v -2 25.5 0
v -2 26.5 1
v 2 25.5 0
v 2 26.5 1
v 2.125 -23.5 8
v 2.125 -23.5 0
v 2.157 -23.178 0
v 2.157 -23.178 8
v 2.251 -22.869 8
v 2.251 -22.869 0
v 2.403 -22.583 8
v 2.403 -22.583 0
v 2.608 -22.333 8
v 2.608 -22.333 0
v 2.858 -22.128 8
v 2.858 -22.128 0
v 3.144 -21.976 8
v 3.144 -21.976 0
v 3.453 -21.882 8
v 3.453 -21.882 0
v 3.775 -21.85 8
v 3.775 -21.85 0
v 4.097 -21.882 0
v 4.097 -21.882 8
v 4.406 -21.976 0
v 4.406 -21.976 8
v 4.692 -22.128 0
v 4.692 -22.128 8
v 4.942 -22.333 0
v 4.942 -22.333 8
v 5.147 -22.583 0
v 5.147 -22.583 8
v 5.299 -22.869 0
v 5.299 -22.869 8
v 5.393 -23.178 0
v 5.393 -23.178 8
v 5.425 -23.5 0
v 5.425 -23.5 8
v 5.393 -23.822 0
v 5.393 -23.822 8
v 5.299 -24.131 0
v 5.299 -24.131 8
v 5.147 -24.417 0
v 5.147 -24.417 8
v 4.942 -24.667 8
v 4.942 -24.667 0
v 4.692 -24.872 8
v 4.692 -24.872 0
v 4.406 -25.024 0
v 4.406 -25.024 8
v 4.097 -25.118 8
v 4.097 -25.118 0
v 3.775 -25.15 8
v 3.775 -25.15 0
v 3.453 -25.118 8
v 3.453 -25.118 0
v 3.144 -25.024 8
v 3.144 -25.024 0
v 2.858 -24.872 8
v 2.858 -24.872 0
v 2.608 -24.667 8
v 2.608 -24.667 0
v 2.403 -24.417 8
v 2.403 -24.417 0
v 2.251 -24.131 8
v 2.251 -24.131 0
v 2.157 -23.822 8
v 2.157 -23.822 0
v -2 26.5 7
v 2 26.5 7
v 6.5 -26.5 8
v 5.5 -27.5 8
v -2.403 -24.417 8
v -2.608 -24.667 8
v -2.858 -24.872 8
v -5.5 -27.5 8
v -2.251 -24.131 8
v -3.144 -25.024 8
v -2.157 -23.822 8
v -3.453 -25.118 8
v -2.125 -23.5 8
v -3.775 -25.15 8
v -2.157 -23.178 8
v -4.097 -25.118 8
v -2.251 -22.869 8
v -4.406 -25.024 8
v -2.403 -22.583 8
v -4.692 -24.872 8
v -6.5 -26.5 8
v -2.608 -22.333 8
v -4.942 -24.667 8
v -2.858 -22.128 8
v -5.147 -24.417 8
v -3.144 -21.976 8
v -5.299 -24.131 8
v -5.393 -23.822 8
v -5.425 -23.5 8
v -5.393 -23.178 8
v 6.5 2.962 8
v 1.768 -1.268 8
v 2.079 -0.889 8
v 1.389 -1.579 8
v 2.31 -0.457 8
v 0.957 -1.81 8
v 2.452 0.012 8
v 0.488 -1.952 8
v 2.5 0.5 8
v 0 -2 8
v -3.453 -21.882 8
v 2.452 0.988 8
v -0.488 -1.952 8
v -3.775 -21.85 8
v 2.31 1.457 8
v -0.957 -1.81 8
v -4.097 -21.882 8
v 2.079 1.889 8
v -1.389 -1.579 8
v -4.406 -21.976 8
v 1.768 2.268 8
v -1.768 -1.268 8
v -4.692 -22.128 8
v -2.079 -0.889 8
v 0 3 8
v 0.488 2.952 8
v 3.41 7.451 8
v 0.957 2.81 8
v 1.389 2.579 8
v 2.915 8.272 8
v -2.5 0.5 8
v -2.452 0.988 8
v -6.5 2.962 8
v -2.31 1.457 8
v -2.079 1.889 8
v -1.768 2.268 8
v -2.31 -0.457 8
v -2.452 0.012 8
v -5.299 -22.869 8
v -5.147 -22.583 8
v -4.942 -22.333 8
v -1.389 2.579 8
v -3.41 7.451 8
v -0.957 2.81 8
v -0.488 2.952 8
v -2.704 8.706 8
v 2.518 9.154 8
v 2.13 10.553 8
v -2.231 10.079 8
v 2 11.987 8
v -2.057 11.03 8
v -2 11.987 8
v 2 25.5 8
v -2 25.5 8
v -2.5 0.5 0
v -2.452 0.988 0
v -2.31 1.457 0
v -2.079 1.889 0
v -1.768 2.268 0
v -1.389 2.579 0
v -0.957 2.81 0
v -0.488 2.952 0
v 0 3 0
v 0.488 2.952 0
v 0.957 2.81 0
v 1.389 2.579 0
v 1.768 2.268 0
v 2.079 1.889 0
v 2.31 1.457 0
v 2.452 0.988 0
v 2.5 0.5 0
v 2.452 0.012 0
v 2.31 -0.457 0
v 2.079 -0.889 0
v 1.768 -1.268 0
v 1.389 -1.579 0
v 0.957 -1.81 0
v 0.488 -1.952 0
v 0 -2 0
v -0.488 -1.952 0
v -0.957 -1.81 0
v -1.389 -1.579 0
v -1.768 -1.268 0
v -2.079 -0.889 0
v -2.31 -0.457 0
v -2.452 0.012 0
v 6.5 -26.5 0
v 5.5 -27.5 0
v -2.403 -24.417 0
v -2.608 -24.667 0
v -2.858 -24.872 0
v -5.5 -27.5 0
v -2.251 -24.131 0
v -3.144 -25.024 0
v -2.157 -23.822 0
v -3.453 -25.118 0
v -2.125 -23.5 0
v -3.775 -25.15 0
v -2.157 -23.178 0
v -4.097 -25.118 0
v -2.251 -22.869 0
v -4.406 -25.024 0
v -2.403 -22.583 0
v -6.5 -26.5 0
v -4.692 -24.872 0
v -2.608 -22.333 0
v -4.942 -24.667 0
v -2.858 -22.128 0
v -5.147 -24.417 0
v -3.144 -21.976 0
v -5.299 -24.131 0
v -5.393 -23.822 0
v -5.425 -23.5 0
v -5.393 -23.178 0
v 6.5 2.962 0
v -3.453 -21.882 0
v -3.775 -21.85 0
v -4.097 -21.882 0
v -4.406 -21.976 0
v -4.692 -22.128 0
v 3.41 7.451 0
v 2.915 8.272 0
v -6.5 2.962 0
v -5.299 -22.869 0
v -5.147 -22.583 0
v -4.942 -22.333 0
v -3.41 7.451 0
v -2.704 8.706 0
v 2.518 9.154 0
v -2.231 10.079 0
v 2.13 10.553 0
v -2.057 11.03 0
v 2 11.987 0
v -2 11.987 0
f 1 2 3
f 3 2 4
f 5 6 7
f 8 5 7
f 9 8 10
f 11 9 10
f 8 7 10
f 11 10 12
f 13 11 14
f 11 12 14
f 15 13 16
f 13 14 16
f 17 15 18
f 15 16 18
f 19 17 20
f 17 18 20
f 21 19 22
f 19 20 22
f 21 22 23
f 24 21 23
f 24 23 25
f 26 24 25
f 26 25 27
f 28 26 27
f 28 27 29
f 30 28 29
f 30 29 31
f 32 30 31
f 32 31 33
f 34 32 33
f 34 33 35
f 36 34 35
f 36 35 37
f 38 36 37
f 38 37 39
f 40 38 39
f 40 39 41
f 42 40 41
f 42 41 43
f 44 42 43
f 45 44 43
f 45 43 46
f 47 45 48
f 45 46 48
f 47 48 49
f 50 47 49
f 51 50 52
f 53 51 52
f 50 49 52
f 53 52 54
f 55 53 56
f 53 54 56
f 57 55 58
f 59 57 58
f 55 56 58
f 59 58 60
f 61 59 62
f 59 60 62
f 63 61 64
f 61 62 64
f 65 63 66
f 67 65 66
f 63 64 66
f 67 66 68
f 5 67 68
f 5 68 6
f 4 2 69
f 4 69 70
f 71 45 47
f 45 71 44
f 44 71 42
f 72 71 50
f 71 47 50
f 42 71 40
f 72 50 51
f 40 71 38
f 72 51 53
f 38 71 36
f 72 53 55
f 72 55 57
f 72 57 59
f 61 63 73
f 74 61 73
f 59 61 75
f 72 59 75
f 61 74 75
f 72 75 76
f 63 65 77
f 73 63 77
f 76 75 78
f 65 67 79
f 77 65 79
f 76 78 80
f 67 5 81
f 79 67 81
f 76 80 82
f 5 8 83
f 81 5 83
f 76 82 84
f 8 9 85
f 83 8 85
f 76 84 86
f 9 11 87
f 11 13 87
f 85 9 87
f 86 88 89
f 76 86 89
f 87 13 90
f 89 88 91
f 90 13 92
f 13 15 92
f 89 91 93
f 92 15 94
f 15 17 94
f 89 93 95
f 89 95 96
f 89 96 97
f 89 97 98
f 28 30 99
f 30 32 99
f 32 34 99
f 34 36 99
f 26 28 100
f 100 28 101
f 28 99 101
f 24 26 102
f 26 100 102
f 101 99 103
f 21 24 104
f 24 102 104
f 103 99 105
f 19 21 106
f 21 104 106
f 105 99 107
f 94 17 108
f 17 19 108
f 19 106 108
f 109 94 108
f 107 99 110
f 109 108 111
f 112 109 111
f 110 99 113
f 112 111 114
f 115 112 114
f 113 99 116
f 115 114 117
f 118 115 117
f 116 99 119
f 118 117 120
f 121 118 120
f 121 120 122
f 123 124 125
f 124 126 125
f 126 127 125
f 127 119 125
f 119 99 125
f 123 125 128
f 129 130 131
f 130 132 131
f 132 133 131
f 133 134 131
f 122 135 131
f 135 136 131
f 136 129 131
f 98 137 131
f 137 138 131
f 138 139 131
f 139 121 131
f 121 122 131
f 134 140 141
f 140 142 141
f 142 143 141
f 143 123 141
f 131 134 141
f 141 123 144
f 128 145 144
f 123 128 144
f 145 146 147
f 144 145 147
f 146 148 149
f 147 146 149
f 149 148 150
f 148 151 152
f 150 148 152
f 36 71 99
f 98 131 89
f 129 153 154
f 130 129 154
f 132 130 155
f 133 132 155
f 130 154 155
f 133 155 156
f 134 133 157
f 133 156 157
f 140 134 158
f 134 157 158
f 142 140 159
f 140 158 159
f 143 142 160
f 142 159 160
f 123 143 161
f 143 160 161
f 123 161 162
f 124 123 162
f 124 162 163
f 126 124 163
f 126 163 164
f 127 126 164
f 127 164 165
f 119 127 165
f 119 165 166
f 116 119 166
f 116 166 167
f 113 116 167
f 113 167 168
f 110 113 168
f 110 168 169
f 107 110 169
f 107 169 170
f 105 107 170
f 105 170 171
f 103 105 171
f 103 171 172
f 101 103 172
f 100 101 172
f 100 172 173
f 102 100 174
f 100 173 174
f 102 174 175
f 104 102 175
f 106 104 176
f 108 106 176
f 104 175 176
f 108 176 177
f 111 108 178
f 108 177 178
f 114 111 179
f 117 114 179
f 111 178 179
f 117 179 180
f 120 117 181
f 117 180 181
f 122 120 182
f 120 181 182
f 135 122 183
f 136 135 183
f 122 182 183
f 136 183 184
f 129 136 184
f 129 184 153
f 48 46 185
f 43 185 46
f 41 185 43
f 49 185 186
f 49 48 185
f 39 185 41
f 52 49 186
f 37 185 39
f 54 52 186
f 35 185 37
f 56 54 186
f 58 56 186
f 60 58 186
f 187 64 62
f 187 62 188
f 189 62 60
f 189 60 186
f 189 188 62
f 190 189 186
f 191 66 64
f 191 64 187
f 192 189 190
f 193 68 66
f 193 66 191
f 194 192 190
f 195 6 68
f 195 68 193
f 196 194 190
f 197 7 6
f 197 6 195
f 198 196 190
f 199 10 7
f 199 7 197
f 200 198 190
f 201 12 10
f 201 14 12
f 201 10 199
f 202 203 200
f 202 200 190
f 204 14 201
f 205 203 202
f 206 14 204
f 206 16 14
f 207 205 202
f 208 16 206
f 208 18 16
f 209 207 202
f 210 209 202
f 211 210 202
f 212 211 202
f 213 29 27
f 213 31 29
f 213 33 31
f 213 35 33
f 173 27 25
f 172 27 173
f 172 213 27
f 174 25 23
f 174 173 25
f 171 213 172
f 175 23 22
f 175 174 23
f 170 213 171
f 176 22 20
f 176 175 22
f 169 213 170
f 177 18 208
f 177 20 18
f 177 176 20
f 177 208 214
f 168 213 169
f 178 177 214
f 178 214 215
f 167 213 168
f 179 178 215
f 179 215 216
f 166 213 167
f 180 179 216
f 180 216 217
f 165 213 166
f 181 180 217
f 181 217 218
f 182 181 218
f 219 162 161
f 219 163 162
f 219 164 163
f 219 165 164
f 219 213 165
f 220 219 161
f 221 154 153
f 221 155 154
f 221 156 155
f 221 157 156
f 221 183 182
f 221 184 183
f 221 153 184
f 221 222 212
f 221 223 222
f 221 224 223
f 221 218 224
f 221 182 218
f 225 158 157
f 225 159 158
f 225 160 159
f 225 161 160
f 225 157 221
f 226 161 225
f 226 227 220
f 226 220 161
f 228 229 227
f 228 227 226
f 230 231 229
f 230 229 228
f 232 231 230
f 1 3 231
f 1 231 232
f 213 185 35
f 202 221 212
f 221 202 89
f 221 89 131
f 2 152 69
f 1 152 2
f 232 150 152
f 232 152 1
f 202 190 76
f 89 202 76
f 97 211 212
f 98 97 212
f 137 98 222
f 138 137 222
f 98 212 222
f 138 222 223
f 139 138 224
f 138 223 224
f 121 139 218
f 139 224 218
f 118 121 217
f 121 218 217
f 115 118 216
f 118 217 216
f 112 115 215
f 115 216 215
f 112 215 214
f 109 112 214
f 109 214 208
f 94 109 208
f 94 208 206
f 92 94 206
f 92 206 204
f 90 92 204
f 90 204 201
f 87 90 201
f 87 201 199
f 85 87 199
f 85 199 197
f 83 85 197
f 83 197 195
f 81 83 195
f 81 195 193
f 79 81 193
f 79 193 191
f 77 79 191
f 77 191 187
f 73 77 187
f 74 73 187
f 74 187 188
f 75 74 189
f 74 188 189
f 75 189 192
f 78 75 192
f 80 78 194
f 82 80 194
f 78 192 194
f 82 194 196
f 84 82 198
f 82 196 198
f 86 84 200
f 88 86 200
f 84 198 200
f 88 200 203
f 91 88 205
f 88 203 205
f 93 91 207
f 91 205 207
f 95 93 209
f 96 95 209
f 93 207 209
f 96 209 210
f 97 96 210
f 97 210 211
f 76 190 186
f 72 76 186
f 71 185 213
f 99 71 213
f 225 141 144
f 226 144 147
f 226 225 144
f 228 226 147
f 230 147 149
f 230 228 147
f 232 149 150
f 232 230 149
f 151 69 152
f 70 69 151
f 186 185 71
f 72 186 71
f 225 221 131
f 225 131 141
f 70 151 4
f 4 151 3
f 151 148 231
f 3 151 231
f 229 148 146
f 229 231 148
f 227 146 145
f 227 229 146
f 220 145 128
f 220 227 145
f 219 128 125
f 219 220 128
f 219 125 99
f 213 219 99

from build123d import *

# Parameters (mm, degrees)
ESQUISSE1_W                             = 13
ESQUISSE1_H                             = 55
BOSS_EXTRU_1_DEPTH                      = 8
TROUS_DE_CENTRAGE_5_0MMTRANSITIONAL_1_D = 5
ESQUISSE4_W                             = 4.5
ESQUISSE4_H                             = 20
ENL_V_MAT_EXTRU_1_DEPTH                 = 30.368350311
CONG_1_R                                = 2
CHANFREIN1_SIZE                         = 1
TROU_TARAUD_M41_D                       = 3.3
CHANFREIN2_START                        = -1
CHANFREIN2_DEPTH                        = 10
ESQUISSE9_W                             = 8
ESQUISSE9_H                             = 8
ENL_V_MAT_EXTRU_2_DEPTH                 = 30.874738493
ESQUISSE10_W                            = 4
ESQUISSE10_H                            = 8
BOSS_EXTRU_2_DEPTH                      = 7
CHANFREIN3_SIZE                         = 1
BOSS_EXTRU_3_START                      = -8
BOSS_EXTRU_3_DEPTH                      = 8
CONG_2_R                                = 8


with BuildPart() as part:
    # Esquisse1 → Boss.-Extru.1 (new body)
    with BuildSketch(Plane.XY):
        Rectangle(ESQUISSE1_W, ESQUISSE1_H)
    extrude(amount=BOSS_EXTRU_1_DEPTH)

    # Trous de centrage Ø5.0mmTransitional 1 (through all)
    with Locations(Plane.XY.offset(8)):
        with Locations((0, 0.5)):
            Hole(TROUS_DE_CENTRAGE_5_0MMTRANSITIONAL_1_D / 2)

    # Esquisse4 → Enlèv. mat.-Extru.1 (cut, through all)
    with BuildSketch(Plane.XY.offset(8)):
        with Locations((4.25, 17.5)):
            Rectangle(ESQUISSE4_W, ESQUISSE4_H)
        with Locations((-4.25, 17.5)):
            Rectangle(ESQUISSE4_W, ESQUISSE4_H)
    extrude(amount=-ENL_V_MAT_EXTRU_1_DEPTH, mode=Mode.SUBTRACT)

    # Congé1
    cong_1_edges = [part.edges().sort_by_distance(p)[0] for p in [
        (2, 7.5, 4),
        (-2, 7.5, 4),
    ]]
    fillet(cong_1_edges, radius=CONG_1_R)

    # Chanfrein1
    chanfrein1_edges = [part.edges().sort_by_distance(p)[0] for p in [
        (6.5, -27.5, 4),
        (-6.5, -27.5, 4),
    ]]
    chamfer(chanfrein1_edges, length=CHANFREIN1_SIZE)

    # Trou taraudé M41 (through all)
    with Locations(Plane.XY.offset(8)):
        with Locations((-3.775, -23.5), (3.775, -23.5)):
            Hole(TROU_TARAUD_M41_D / 2)

    # Chanfrein2: read off the stored shape, not the designer's step
    # Chanfrein2 outline → Chanfrein2 (cut)
    with BuildSketch(Plane.XY.offset(CHANFREIN2_START)):
        with BuildLine():
            Line((3.285714286, 7.631900453), (6.5, 2.961651585))
            Line((6.5, 2.961651585), (6.5, 7.5))
            Line((6.5, 7.5), (4, 7.5))
            ThreePointArc((4, 7.5), (3.636818981, 7.533251529), (3.285714286, 7.631900453))
        make_face()
        with BuildLine():
            Line((-6.5, 2.961651585), (-3.285714286, 7.631900453))
            ThreePointArc((-3.285714286, 7.631900453), (-3.636818981, 7.533251529), (-4, 7.5))
            Line((-4, 7.5), (-6.5, 7.5))
            Line((-6.5, 7.5), (-6.5, 2.961651585))
        make_face()
    extrude(amount=CHANFREIN2_DEPTH, mode=Mode.SUBTRACT)

    # Esquisse9 → Enlèv. mat.-Extru.2 (cut, through all)
    with BuildSketch(Plane.ZY.offset(2)):
        with Locations((4, 23.5)):
            Rectangle(ESQUISSE9_W, ESQUISSE9_H)
    extrude(amount=-ENL_V_MAT_EXTRU_2_DEPTH, mode=Mode.SUBTRACT)

    # Esquisse10 → Boss.-Extru.2 (add)
    with BuildSketch(Plane(origin=(0, 19.5, 0), x_dir=(1, 0, 0), z_dir=(0, 1, 0))):
        with Locations((0, -4)):
            Rectangle(ESQUISSE10_W, ESQUISSE10_H)
    extrude(amount=BOSS_EXTRU_2_DEPTH)

    # Chanfrein3
    chanfrein3_edges = [part.edges().sort_by_distance(p)[0] for p in [
        (0, 26.5, 0),
        (0, 26.5, 8),
    ]]
    chamfer(chanfrein3_edges, length=CHANFREIN3_SIZE)

    # Esquisse11 → Boss.-Extru.3 (add)
    with BuildSketch(Plane.XY.offset(8).offset(BOSS_EXTRU_3_START)):
        with BuildLine():
            Line((-3.285714286, 7.631900453), (-2, 9.5))
            ThreePointArc((-2, 9.5), (-2.352491058, 8.366106581), (-3.285714286, 7.631900453))
        make_face()
        with BuildLine():
            Line((3.285714286, 7.631900453), (2, 9.5))
            ThreePointArc((2, 9.5), (2.352491058, 8.366106581), (3.285714286, 7.631900453))
        make_face()
    extrude(amount=BOSS_EXTRU_3_DEPTH)

    # Congé2
    cong_2_edges = [part.edges().sort_by_distance(p)[0] for p in [
        (-2, 9.5, 4),
        (2, 9.5, 4),
    ]]
    fillet(cong_2_edges, radius=CONG_2_R)


solid = part.part
